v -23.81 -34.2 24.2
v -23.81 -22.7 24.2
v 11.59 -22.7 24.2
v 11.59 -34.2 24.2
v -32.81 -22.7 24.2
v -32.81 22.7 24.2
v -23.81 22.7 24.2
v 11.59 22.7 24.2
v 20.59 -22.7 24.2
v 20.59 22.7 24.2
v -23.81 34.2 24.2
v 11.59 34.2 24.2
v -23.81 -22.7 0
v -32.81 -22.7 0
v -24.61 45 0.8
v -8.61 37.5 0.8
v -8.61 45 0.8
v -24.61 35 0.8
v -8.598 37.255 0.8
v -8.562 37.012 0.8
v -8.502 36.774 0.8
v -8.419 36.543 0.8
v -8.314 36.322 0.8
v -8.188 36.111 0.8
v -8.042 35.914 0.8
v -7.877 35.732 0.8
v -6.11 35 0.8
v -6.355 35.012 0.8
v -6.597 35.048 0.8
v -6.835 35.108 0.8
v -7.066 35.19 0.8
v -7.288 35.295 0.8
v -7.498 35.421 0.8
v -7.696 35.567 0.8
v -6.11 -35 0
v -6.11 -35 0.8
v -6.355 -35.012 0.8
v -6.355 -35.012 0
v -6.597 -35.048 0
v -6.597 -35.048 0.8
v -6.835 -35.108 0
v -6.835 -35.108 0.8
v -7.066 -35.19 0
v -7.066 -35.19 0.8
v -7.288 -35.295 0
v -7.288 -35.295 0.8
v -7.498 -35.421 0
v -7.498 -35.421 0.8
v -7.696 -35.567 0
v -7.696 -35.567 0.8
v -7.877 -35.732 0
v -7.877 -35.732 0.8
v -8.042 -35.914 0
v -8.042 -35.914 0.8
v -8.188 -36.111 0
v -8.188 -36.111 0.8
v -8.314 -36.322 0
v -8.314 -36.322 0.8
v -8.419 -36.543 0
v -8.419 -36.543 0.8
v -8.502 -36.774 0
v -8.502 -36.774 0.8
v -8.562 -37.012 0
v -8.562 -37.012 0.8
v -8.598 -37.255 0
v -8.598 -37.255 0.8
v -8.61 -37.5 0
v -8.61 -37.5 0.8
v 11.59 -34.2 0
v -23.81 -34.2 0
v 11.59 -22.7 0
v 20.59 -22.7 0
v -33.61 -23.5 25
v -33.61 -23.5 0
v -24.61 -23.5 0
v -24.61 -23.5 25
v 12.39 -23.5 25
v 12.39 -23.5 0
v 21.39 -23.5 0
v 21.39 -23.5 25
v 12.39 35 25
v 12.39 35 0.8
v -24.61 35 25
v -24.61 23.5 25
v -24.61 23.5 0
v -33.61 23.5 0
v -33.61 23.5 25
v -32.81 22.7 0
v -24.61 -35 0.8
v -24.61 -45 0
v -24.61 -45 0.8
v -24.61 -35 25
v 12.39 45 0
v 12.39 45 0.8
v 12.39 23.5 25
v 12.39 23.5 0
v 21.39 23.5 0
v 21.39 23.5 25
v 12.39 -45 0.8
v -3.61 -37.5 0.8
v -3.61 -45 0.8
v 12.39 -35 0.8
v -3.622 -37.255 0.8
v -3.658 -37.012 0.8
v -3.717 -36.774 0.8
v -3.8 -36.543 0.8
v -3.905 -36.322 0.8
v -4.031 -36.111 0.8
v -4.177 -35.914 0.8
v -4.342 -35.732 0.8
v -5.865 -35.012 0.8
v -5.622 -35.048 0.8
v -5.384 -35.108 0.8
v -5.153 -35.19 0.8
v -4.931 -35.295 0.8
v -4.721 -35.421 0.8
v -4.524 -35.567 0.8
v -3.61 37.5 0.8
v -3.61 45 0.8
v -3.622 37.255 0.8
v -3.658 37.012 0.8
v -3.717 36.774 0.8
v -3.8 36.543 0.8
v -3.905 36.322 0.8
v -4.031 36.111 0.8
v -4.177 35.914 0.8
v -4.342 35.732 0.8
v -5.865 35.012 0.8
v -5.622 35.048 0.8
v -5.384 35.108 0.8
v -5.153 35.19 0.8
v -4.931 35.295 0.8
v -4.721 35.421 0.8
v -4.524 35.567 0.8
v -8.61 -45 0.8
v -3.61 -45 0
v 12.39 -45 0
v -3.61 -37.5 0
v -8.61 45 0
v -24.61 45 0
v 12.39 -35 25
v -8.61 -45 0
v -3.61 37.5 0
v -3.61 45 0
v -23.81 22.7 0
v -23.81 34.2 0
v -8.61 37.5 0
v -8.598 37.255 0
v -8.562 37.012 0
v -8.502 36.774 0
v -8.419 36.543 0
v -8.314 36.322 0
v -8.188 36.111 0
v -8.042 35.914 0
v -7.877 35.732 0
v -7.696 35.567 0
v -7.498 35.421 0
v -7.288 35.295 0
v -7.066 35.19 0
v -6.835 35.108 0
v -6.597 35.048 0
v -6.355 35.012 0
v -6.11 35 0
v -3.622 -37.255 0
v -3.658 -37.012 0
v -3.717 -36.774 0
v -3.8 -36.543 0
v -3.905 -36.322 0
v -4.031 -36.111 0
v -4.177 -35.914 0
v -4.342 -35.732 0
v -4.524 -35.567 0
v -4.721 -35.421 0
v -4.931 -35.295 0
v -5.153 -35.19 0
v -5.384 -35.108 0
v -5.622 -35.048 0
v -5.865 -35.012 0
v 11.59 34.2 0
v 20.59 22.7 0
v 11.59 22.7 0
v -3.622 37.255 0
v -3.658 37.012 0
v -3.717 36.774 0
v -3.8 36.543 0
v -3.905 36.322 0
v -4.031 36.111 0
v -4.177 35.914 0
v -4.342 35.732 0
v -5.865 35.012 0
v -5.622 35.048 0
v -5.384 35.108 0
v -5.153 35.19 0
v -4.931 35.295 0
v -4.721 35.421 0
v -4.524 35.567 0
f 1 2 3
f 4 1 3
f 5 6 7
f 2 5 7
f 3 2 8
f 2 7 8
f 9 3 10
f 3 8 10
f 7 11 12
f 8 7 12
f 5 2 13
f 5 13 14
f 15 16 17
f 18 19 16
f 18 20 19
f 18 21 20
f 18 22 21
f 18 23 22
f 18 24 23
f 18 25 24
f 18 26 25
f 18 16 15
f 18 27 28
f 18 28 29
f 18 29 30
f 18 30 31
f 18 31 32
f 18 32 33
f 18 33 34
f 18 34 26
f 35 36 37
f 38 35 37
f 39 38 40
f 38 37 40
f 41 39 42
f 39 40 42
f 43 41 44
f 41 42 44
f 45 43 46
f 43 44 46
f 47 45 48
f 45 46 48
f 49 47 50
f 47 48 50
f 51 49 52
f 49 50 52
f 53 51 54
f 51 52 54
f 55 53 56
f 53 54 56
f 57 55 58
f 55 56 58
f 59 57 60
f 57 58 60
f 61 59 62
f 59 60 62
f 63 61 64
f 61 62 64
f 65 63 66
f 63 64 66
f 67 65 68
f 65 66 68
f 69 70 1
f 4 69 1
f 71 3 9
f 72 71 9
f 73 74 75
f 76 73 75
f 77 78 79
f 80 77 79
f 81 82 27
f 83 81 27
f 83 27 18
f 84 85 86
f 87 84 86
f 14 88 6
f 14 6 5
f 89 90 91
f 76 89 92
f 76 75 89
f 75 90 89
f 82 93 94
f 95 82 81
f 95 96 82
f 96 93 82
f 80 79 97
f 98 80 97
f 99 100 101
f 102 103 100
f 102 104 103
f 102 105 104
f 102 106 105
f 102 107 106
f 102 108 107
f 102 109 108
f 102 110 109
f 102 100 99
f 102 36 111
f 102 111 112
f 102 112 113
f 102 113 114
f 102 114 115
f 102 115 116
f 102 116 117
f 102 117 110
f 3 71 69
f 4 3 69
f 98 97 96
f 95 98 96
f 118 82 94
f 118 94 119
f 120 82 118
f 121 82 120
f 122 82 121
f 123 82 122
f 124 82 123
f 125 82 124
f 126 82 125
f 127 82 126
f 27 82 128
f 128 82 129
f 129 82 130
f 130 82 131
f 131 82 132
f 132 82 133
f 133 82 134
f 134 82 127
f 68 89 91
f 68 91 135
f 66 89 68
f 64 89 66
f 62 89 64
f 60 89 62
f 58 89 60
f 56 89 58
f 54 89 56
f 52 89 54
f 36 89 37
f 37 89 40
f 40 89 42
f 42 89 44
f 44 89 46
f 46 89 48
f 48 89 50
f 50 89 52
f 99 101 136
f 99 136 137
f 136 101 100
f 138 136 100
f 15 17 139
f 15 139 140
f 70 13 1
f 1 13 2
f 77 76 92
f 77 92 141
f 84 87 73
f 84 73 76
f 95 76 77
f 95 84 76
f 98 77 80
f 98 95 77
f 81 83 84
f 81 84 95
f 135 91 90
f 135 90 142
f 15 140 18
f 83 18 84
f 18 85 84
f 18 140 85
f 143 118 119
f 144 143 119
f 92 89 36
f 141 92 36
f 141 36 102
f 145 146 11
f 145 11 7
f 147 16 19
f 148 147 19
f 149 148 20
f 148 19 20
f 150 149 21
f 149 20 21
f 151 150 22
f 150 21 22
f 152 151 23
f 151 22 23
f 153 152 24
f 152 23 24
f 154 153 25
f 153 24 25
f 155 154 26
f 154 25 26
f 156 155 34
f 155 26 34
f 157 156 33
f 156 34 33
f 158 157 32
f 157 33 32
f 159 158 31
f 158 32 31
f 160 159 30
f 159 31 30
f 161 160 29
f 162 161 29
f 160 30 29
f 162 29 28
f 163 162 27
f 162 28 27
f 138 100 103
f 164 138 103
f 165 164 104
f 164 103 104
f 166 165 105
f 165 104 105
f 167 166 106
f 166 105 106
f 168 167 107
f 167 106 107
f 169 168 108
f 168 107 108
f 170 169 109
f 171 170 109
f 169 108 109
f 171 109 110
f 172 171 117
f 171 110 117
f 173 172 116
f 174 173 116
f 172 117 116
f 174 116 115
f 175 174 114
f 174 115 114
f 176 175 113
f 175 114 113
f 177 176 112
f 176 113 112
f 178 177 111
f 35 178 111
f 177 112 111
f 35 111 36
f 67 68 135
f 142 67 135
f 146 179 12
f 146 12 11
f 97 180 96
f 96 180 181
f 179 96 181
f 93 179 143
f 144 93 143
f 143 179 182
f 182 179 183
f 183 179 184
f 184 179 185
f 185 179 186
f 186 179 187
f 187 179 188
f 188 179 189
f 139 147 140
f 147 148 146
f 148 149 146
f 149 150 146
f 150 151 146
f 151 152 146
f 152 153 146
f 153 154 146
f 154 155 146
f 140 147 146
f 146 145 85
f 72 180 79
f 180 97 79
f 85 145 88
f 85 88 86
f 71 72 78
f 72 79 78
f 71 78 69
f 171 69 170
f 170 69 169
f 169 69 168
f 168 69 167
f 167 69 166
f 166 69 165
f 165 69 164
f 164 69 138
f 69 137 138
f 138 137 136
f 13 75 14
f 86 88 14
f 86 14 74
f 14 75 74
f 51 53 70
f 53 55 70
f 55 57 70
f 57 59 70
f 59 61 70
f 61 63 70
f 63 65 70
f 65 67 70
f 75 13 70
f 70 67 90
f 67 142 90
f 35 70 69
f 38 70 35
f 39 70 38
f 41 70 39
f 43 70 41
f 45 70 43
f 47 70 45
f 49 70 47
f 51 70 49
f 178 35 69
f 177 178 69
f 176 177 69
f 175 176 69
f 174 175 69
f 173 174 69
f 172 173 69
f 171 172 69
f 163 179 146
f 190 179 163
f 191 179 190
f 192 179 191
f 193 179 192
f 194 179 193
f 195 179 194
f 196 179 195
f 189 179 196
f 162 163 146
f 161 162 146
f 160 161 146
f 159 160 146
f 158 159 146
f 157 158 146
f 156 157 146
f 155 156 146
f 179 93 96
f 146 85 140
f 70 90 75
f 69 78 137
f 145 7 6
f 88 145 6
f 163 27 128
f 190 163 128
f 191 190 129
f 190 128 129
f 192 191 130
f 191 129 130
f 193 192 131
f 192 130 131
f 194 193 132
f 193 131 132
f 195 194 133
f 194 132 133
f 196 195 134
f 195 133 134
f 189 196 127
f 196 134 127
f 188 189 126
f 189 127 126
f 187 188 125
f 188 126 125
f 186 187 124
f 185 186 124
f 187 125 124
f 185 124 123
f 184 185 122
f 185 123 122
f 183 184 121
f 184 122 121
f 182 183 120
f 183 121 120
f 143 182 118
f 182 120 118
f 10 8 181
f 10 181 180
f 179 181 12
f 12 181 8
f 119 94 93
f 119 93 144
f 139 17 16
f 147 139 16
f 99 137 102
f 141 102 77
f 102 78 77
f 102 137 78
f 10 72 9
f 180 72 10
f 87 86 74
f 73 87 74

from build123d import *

# Parameters (mm, degrees)
F1_DEPTH    = 25
F2_W        = 37
F2_H        = 0.8
F3_DEPTH    = 10
F4_W        = 37
F4_H        = 0.8
F5_DEPTH    = 10
F6_T        = 0.8
F6_T3_DEPTH = 26.6
F6_T5_DEPTH = 38.6
F9_DEPTH    = 2


# Not quite as in the source:
# - a shell that OpenCascade refuses in one call is made with other operations: the cavity is built on its own and cut out


with BuildPart() as f1:
    # F0 (on Top) → F1 (new body)
    with BuildSketch(Plane.XY):
        Polygon((-33.6095448622, 23.5), (-33.6095448622, -23.5), (-24.6095448622, -23.5), (-24.6095448622, -35), (12.3904551378, -35), (12.3904551378, -23.5), (21.3904551378, -23.5), (21.3904551378, 23.5), (12.3904551378, 23.5), (12.3904551378, 35), (-24.6095448622, 35), (-24.6095448622, 23.5), align=None)
    extrude(amount=F1_DEPTH)

    # F2 (on face) → F3 (join)
    with BuildSketch(Plane.XZ.offset(35)):
        with Locations((-6.1095448622, 0.4)):
            Rectangle(F2_W, F2_H)
    extrude(amount=F3_DEPTH)

    # F4 (on face) → F5 (join)
    with BuildSketch(Plane(origin=(0, 35, 0), x_dir=(-1, 0, 0), z_dir=(0, 1, 0))):
        with Locations((6.1095448622, 0.4)):
            Rectangle(F4_W, F4_H)
    extrude(amount=F5_DEPTH)

    # F6: shell of thickness 0.8, made by hand


with BuildPart() as f6_core1:
    # F6_t2: copy of F1
    add(f1.part)

    # the walls: a layer under each face that stays
    f6_faces = [f6_core1.faces().sort_by_distance(p)[0] for p in [
        (-33.6095448622, 0, 12.5),
        (-6.1095448622, 0, 25),
        (-24.6095448622, 34.25, 12.5),
        (-6.1095448622, 40, 0.8),
        (-6.1095448622, 45, 0.4),
        (-6.1095448622, 35, 12.9),
        (12.3904551378, 34.25, 12.5),
        (16.8904551378, 23.5, 12.5),
        (21.3904551378, 0, 12.5),
        (16.8904551378, -23.5, 12.5),
        (12.3904551378, -34.25, 12.5),
        (-6.1095448622, -40, 0.8),
        (-6.1095448622, -45, 0.4),
        (-6.1095448622, -35, 12.9),
        (-24.6095448622, -34.25, 12.5),
        (-29.1095448622, -23.5, 12.5),
        (-29.1095448622, 23.5, 12.5),
    ]]
    thicken(f6_faces, amount=-F6_T, mode=Mode.SUBTRACT)

    # F6_s4 → F6_t3 (cut)
    with BuildSketch(Plane.XY.offset(-0.8)):
        Polygon((-24.6175448622, 23.508), (-23.8095448622, 23.5), (-23.8095448622, 22.7), (-24.6095448622, 22.7), align=None)
        Polygon((12.3984551378, 23.508), (11.5904551378, 23.5), (11.5904551378, 22.7), (12.3904551378, 22.7), align=None)
        Polygon((12.3984551378, -23.508), (12.3904551378, -22.7), (11.5904551378, -22.7), (11.5904551378, -23.5), align=None)
        Polygon((-24.6175448622, -23.508), (-23.8095448622, -23.5), (-23.8095448622, -22.7), (-24.6095448622, -22.7), align=None)
    extrude(amount=F6_T3_DEPTH, mode=Mode.SUBTRACT)

    # F6_s6 → F6_t5 (cut)
    with BuildSketch(Plane.YZ.offset(-25.4095448622)):
        Polygon((35.008, 0.808), (35, 0), (34.2, 0), (34.2, 0.8), align=None)
        Polygon((-35.008, 0.808), (-35, 0), (-34.2, 0), (-34.2, 0.8), align=None)
    extrude(amount=F6_T5_DEPTH, mode=Mode.SUBTRACT)


with BuildPart() as f1_1:
    add(f1.part)

    # what is left inside the walls is the cavity
    f6_cavity = [f6_core1.part.solids().sort_by_distance(p)[0] for p in [
        (-6.109545, -11.4, 24.192),
    ]]
    add(f6_cavity, mode=Mode.SUBTRACT)

    # F8 (on face) + F7 (on face) → F9 (cut)
    with BuildSketch(Plane.XY.offset(0.8)):
        with BuildLine():
            Line((-8.6095448622, -37.5000002948), (-8.6095448622, -45))
            Line((-8.6095448622, -45), (-3.6095448622, -45))
            Line((-3.6095448622, -45), (-3.6095448622, -37.5))
            ThreePointArc((-3.6095448622, -37.5), (-4.3417779216, -35.7322330347), (-6.1095448972, -35))
            ThreePointArc((-6.1095448972, -35), (-7.8773119318, -35.7322331636), (-8.6095448622, -37.5000002948))
        make_face()
    with BuildSketch(Plane.XY.offset(0.8)):
        with BuildLine():
            Line((-3.6095448622, 37.5), (-3.6095448622, 45))
            Line((-3.6095448622, 45), (-8.6095448622, 45))
            Line((-8.6095448622, 45), (-8.6095448622, 37.5))
            ThreePointArc((-8.6095448622, 37.5), (-7.8773118305, 35.7322330623), (-6.1095449054, 35))
            ThreePointArc((-6.1095449054, 35), (-4.3417779245, 35.7322330318), (-3.6095448622, 37.5))
        make_face()
    extrude(amount=-F9_DEPTH, mode=Mode.SUBTRACT)


solid = f1_1.part
